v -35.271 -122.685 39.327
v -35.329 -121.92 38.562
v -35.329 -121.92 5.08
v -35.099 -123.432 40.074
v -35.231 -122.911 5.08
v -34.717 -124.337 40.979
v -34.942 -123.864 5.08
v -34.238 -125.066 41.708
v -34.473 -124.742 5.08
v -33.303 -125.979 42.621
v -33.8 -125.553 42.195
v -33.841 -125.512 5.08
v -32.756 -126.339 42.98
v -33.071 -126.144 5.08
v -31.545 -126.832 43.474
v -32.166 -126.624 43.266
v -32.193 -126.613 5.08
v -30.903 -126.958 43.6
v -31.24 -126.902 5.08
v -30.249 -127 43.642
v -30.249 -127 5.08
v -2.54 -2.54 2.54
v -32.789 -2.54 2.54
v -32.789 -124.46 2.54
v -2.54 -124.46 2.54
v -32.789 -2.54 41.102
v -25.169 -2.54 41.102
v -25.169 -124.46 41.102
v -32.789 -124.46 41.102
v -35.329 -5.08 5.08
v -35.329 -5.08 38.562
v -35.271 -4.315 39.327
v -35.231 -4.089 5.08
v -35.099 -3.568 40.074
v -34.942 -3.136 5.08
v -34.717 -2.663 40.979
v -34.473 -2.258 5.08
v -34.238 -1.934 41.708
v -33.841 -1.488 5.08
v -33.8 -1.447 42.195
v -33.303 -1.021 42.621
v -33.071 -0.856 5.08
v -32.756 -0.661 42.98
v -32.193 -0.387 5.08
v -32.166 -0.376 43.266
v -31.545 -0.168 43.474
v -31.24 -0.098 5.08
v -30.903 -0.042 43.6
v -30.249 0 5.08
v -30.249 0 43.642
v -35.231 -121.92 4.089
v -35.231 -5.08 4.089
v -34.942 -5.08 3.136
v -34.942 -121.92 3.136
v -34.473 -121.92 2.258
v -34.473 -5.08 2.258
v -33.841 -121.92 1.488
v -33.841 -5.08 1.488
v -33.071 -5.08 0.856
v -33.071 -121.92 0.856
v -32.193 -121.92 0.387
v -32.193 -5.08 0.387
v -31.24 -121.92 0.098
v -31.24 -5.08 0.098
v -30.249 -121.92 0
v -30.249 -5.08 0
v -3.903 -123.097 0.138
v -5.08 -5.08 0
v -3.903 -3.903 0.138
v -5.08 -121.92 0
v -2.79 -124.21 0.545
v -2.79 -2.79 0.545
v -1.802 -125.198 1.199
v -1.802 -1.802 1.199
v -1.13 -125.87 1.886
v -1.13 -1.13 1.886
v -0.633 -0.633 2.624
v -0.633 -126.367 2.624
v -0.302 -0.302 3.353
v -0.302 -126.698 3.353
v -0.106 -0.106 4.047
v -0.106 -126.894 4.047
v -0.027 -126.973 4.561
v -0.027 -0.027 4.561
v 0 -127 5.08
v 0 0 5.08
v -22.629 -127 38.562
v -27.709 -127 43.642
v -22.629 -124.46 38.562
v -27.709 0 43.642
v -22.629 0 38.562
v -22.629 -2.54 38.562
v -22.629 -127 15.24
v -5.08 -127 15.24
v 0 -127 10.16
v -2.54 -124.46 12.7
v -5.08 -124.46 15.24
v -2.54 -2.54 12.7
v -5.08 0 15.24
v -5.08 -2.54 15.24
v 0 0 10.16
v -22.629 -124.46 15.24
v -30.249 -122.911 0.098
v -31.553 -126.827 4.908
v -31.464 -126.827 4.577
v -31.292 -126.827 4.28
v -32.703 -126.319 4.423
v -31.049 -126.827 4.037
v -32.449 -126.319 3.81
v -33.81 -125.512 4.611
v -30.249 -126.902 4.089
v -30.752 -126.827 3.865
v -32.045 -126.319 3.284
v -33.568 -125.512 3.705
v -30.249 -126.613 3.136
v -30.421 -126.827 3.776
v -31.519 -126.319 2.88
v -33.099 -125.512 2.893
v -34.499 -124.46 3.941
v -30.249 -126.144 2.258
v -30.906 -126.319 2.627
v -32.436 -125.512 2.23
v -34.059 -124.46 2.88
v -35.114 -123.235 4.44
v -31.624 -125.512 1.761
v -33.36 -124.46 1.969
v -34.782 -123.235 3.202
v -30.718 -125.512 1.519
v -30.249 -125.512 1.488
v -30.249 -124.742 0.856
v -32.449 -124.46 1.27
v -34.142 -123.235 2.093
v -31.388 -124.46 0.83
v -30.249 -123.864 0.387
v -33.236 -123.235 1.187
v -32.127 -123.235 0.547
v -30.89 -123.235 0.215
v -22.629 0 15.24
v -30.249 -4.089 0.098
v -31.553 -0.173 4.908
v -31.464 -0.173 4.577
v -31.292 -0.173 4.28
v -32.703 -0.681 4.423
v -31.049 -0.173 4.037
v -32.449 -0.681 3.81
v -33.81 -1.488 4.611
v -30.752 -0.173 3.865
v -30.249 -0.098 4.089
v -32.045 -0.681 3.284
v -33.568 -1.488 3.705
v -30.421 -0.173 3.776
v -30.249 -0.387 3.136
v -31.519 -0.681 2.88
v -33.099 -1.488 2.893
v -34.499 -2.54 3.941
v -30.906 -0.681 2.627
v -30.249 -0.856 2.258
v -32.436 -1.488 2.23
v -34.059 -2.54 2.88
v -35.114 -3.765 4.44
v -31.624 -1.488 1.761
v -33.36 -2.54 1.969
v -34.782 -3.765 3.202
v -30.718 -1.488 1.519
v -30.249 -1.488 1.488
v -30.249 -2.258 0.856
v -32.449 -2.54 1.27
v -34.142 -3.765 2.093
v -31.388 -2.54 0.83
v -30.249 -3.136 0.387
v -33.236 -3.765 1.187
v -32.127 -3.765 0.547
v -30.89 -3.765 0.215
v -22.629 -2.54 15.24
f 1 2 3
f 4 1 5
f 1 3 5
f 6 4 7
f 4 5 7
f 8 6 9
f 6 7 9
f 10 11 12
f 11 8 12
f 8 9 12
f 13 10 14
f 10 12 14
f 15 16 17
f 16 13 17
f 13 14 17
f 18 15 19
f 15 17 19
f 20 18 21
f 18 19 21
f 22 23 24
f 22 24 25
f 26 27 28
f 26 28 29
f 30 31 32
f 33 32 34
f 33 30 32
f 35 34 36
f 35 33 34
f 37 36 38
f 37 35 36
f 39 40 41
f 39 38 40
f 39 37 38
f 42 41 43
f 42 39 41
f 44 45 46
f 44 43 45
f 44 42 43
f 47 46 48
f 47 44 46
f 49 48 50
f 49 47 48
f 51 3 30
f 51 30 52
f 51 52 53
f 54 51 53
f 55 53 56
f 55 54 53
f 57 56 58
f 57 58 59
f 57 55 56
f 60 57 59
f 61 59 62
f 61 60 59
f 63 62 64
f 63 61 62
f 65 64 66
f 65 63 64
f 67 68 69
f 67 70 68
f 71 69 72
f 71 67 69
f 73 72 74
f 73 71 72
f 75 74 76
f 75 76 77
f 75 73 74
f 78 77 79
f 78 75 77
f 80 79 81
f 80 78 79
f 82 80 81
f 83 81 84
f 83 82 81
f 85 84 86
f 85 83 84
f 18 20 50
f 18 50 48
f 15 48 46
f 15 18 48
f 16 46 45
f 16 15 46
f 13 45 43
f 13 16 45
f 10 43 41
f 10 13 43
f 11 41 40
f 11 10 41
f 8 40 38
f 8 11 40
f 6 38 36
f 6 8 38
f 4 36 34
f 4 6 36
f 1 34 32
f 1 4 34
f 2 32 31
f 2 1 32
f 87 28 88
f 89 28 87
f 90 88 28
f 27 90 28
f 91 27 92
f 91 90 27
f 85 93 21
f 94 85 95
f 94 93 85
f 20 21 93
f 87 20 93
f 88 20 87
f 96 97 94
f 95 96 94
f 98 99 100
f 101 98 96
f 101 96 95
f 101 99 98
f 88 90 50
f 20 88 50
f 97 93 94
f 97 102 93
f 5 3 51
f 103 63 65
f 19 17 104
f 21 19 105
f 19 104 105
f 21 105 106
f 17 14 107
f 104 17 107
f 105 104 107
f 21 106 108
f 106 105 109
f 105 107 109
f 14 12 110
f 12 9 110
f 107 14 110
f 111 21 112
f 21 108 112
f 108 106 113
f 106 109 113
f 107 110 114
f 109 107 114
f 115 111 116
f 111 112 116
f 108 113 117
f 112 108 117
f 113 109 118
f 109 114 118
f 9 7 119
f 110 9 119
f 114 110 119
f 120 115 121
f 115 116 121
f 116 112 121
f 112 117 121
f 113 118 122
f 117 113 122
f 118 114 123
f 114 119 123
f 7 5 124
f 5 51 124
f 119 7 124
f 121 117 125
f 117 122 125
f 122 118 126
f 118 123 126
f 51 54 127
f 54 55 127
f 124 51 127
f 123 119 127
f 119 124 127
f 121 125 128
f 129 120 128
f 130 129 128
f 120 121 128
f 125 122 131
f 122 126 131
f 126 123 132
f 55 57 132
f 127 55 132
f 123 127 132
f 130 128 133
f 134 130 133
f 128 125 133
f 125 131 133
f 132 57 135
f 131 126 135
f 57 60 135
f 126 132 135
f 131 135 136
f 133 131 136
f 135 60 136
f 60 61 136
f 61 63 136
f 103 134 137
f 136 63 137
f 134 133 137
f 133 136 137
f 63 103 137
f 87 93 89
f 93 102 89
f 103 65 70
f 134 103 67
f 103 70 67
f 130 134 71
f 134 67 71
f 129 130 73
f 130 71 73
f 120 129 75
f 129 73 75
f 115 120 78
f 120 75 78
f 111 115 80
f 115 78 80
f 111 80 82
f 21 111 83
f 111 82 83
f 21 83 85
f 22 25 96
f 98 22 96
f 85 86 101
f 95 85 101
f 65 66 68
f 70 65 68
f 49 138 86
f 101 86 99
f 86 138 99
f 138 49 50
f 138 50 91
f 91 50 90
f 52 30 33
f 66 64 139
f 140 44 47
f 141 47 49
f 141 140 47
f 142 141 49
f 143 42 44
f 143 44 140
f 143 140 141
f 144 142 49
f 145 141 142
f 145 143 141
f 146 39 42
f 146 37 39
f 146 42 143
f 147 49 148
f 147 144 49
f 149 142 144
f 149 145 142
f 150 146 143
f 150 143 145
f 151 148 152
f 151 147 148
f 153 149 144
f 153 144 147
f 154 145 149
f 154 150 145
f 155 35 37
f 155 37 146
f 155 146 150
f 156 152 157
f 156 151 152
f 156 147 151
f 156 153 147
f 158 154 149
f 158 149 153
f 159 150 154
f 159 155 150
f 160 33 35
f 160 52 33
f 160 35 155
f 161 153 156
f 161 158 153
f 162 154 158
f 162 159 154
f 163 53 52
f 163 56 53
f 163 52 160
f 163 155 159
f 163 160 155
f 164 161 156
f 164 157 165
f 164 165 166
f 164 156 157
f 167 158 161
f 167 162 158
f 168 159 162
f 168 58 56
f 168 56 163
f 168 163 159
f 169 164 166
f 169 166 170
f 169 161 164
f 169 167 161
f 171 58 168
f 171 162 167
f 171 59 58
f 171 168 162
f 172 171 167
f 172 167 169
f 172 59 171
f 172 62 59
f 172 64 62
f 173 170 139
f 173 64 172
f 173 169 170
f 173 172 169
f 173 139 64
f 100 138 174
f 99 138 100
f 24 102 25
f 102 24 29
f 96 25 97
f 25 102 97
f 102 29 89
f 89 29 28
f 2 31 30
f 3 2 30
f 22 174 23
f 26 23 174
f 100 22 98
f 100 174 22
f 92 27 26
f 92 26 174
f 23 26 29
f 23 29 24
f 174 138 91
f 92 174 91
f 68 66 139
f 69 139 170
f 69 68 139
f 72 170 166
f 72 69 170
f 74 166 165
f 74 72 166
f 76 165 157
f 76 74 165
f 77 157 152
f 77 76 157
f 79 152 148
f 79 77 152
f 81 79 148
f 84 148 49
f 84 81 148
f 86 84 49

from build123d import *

# Parameters (mm, degrees)
F0_W        = 22.6290904153
F0_H        = 15.2400004526
F1_DEPTH    = 127
F2_T        = -2.54
F3_R        = 5.08
F4_T1_DEPTH = 153.1282991577


# Not quite as in the source:
# - a fillet or chamfer that OpenCascade refuses, or shapes differently, is made with other operations: its cross-section is extruded or revolved along the edge and cut away or added


with BuildPart() as f1:
    # F0 (on Front) → F1 (new body)
    with BuildSketch(Plane.XZ):
        Polygon((-22.6290904153, 0), (-22.6290904153, 15.2400004526), (-22.6290904153, 43.6418191694), (-35.3290904153, 43.6418191694), (-35.3290904153, 0), align=None)
        with Locations((-11.3145452077, 7.6200002263)):
            Rectangle(F0_W, F0_H)
    extrude(amount=F1_DEPTH)

    # F2
    f2_openings = [f1.faces().sort_by_distance(p)[0] for p in [
        (-22.62909, -63.5, 29.44091),
        (-11.314545, -63.5, 15.24),
    ]]
    offset(amount=F2_T, openings=f2_openings)

    # F3
    f3_edges = [f1.edges().sort_by_distance(p)[0] for p in [
        (-35.32909, -63.5, 43.641819),
        (0, -63.5, 0),
        (-35.32909, -63.5, 0),
        (-35.32909, 0, 21.82091),
        (-35.32909, -127, 21.82091),
        (-17.664545, -127, 0),
        (-17.664545, 0, 0),
    ]]
    fillet(f3_edges, radius=F3_R)

    # F4: chamfer of 5.08 on 2 edges, made by hand

    # F4_s2 → F4_t1 (cut)
    with BuildSketch(Plane.XZ.offset(-13.0641495789)):
        Polygon((-27.7090904153, 43.6418191694), (-22.6290904153, 38.5618191694), (-22.6290904153, 43.6418191694), align=None)
        Polygon((-5.08, 15.2400004526), (0, 10.1600004526), (0, 15.2400004526), align=None)
    extrude(amount=F4_T1_DEPTH, mode=Mode.SUBTRACT)


solid = f1.part
